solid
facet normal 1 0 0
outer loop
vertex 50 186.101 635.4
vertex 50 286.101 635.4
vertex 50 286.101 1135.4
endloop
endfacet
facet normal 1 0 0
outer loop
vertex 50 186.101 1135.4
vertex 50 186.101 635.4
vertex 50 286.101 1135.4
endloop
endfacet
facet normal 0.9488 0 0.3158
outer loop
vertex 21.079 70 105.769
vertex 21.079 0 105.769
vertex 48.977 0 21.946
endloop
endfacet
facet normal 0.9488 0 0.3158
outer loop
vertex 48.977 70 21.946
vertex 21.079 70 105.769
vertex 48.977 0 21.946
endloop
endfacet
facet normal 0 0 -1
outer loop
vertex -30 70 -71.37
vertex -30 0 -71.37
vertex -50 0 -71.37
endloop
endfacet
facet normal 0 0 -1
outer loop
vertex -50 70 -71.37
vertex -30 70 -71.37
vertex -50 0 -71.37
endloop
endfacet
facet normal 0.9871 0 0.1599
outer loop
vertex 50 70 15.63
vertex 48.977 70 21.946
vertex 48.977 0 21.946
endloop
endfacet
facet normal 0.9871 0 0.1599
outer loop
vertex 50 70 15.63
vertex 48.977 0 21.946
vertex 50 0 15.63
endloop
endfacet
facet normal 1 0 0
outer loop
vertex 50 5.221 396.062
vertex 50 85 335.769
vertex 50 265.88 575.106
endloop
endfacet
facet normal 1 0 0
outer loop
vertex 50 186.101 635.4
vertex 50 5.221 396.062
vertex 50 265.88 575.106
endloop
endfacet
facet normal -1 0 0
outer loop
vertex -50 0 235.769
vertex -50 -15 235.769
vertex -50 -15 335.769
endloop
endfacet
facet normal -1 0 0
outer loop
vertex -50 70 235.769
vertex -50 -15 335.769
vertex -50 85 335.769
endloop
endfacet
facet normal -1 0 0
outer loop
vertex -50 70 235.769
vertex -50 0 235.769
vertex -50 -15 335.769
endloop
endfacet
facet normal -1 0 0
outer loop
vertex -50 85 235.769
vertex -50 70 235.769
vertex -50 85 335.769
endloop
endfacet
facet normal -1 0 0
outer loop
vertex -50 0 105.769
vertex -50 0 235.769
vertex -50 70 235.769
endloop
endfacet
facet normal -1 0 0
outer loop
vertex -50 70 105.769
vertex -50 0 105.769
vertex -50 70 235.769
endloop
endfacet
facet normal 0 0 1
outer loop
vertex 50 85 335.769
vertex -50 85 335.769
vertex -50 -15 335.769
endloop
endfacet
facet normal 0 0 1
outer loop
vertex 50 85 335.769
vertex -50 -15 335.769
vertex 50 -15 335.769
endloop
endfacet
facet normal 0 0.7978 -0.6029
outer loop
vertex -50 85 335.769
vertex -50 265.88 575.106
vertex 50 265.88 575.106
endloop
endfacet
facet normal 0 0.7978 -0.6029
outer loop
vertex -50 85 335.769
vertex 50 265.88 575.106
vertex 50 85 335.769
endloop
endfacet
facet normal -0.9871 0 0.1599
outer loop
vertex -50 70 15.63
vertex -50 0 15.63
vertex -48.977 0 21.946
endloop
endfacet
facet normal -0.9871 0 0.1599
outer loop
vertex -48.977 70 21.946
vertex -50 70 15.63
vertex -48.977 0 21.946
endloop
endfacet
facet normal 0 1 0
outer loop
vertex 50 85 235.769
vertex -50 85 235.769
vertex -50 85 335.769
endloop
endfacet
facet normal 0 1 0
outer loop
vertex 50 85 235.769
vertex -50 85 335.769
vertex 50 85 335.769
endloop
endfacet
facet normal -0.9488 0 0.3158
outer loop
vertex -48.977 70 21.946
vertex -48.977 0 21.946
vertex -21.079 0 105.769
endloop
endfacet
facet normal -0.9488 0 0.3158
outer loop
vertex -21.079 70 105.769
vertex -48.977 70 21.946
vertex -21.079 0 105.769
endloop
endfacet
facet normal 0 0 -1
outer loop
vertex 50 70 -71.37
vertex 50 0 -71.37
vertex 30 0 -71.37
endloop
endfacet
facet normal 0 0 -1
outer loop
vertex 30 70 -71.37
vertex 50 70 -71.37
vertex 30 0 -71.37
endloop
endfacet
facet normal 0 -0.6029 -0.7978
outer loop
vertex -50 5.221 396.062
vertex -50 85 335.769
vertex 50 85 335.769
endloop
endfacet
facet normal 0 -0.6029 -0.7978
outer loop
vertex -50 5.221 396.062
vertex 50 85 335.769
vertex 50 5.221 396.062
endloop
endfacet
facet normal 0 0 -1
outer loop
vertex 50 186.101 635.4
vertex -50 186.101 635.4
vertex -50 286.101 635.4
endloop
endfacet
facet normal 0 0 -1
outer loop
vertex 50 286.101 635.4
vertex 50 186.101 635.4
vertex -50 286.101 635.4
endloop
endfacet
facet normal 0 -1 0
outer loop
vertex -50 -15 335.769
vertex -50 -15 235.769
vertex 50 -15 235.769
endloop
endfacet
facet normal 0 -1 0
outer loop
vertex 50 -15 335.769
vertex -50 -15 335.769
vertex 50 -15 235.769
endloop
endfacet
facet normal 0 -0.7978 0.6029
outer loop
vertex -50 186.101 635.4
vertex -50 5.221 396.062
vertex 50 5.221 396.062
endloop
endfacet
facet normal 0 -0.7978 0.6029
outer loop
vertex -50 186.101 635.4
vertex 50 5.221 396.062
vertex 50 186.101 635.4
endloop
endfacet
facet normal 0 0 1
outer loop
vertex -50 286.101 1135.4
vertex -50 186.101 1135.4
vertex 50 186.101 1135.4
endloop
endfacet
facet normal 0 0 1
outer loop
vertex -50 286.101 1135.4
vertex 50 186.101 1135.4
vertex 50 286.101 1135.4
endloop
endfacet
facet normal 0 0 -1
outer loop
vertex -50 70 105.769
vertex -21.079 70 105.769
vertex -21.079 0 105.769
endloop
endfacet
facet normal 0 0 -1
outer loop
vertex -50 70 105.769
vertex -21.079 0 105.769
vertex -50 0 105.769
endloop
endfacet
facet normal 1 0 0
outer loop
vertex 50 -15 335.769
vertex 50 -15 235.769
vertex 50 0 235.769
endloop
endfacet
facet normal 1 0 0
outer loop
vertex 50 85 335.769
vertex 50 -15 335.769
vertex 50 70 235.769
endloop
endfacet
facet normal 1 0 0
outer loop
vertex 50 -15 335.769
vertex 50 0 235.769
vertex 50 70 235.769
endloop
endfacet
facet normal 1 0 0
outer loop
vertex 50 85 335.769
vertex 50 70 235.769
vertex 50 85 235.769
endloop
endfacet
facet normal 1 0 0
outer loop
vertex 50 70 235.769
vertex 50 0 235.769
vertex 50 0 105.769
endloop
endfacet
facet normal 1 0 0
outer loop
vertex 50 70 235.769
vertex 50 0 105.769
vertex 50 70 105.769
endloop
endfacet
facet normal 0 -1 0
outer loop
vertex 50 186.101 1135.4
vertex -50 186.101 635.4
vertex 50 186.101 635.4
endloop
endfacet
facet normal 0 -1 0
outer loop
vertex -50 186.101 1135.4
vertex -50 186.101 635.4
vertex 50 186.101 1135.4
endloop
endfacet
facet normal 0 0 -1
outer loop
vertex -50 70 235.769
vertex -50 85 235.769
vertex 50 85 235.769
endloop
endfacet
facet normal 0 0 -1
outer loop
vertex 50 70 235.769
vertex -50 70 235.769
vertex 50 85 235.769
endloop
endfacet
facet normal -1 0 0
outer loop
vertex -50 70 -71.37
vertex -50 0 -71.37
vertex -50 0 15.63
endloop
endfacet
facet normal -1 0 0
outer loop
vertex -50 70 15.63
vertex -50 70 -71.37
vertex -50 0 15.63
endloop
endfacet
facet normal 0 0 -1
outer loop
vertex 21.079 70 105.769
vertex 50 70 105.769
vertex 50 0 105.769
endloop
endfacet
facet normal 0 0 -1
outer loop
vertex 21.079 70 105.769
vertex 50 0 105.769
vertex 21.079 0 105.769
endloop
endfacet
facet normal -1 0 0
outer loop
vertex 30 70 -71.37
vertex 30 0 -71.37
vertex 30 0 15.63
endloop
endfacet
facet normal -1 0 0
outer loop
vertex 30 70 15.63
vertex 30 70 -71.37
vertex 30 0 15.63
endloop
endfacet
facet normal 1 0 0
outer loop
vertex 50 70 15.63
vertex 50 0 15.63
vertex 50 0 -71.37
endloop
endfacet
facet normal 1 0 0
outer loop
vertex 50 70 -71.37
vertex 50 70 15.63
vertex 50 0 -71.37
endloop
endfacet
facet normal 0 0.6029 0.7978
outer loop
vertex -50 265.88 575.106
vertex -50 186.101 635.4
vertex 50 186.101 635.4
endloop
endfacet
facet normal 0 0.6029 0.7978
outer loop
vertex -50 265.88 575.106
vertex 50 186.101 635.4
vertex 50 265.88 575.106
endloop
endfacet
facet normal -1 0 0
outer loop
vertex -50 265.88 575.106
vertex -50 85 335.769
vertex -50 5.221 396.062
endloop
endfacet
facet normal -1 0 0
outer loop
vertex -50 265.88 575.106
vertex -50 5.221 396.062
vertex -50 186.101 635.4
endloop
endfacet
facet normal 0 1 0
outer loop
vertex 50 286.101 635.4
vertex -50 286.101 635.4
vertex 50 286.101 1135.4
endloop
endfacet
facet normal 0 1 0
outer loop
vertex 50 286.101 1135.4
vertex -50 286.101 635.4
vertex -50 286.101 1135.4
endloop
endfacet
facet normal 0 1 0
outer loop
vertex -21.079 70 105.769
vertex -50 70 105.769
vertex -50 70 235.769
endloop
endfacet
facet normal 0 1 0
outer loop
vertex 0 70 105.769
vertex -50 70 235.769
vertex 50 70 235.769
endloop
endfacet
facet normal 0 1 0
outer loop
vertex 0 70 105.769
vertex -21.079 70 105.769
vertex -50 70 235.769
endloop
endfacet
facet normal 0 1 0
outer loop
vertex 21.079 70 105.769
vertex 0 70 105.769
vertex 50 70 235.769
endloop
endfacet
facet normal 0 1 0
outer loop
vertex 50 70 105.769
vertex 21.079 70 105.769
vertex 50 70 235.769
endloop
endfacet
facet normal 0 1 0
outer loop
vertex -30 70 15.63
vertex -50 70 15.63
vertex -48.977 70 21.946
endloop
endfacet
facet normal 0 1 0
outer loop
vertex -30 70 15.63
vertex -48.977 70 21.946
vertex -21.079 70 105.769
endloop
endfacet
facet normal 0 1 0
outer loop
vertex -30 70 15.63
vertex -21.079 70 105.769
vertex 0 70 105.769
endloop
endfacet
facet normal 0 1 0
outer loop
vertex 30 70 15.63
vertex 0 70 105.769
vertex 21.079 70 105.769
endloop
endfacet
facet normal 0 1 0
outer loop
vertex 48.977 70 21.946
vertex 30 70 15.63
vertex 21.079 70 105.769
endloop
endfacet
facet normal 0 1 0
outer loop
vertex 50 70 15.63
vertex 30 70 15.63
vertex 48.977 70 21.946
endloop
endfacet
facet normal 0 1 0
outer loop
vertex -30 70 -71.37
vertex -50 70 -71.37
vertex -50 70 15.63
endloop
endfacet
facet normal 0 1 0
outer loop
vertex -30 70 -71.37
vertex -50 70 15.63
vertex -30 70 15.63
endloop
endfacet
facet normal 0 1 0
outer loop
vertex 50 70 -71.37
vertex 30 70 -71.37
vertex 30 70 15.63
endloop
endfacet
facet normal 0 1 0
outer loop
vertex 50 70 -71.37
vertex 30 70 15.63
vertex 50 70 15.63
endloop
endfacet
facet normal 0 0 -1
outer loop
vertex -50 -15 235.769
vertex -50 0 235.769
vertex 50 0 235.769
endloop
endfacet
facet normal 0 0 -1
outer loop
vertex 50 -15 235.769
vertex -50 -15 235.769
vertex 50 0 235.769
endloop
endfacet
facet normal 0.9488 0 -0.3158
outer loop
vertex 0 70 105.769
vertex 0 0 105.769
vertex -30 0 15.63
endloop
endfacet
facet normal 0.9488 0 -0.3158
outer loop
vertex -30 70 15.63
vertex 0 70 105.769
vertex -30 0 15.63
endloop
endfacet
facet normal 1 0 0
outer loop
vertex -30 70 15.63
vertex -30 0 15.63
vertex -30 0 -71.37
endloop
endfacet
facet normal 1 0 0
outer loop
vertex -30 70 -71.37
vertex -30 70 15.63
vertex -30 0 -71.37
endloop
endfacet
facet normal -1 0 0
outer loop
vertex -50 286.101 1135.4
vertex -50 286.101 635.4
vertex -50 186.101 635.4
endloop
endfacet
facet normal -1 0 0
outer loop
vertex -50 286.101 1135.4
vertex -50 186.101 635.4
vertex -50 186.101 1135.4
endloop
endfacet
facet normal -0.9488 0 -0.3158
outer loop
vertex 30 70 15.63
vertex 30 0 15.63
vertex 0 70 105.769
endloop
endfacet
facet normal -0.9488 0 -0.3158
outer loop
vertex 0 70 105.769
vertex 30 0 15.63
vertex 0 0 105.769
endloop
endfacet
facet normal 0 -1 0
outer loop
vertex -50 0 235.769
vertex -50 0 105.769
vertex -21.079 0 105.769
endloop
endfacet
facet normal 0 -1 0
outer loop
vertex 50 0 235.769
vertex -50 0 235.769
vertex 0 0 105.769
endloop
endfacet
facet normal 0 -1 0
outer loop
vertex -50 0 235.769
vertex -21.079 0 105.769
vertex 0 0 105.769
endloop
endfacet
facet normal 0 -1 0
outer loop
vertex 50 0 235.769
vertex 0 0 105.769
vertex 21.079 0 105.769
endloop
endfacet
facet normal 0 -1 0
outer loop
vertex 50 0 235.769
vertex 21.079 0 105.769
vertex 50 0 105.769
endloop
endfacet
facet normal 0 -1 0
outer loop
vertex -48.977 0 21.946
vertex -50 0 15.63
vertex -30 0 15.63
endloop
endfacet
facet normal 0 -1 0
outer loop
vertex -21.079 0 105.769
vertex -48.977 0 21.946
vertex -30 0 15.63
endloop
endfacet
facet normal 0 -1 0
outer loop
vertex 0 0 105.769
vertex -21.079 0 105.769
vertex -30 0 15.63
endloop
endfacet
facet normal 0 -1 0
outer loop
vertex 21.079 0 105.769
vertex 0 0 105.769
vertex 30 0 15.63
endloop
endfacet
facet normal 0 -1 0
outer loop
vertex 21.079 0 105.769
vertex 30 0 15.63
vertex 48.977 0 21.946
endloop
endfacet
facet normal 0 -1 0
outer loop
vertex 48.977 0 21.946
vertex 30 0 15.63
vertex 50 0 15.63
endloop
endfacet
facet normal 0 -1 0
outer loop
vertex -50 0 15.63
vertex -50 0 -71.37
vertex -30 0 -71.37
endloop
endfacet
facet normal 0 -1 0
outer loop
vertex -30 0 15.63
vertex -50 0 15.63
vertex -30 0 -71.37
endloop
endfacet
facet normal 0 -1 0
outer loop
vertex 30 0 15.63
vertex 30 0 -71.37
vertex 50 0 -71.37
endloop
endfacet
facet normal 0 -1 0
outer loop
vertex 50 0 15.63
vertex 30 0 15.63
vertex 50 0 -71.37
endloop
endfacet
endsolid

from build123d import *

# Parameters (mm, degrees)
BOSS_EXTRUDE1_DEPTH = 70
SKETCH2_W           = 100
SKETCH2_H           = 100
BOSS_EXTRUDE2_DEPTH = 100
BOSS_EXTRUDE3_DEPTH = 100
SKETCH4_W           = 500
SKETCH4_H           = 100
BOSS_EXTRUDE4_DEPTH = 100


with BuildPart() as part:
    # Sketch1 → Boss-Extrude1 (new body)
    with BuildSketch(Plane(origin=(0, 0, 0), x_dir=(1, 0, 0), z_dir=(0, 1, 0))):
        Polygon((0, -105.768782521), (-30, -15.630000635), (-30, 71.369999365), (-50, 71.369999365), (-50, -15.630000635), (-48.97658566, -21.945790108), (-21.078607457, -105.768782521), (-50, -105.768782521), (-50, -235.768782521), (50, -235.768782521), (50, -105.768782521), (21.078607457, -105.768782521), (48.97658566, -21.945790108), (50, -15.630000635), (50, 71.369999365), (30, 71.369999365), (30, -15.630000635), align=None)
    extrude(amount=BOSS_EXTRUDE1_DEPTH)

    # Sketch2 → Boss-Extrude2 (add)
    with BuildSketch(Plane.XY.offset(235.768782521)):
        with Locations((0, 35)):
            Rectangle(SKETCH2_W, SKETCH2_H)
    extrude(amount=BOSS_EXTRUDE2_DEPTH)


with BuildPart() as body_2:
    # Sketch3 → Boss-Extrude3 (new body)
    with BuildSketch(Plane.ZY.offset(50)):
        Polygon((335.768782521, 85), (396.06206918, 5.220807325), (635.399647205, 186.100667301), (575.106360546, 265.879859976), align=None)
    extrude(amount=-BOSS_EXTRUDE3_DEPTH)


with BuildPart() as body_3:
    # Sketch4 → Boss-Extrude4 (new body)
    with BuildSketch(Plane.ZY.offset(50)):
        with Locations((885.399647205, 236.100667301)):
            Rectangle(SKETCH4_W, SKETCH4_H)
    extrude(amount=-BOSS_EXTRUDE4_DEPTH)


solid = Compound([part.part, body_2.part, body_3.part])
